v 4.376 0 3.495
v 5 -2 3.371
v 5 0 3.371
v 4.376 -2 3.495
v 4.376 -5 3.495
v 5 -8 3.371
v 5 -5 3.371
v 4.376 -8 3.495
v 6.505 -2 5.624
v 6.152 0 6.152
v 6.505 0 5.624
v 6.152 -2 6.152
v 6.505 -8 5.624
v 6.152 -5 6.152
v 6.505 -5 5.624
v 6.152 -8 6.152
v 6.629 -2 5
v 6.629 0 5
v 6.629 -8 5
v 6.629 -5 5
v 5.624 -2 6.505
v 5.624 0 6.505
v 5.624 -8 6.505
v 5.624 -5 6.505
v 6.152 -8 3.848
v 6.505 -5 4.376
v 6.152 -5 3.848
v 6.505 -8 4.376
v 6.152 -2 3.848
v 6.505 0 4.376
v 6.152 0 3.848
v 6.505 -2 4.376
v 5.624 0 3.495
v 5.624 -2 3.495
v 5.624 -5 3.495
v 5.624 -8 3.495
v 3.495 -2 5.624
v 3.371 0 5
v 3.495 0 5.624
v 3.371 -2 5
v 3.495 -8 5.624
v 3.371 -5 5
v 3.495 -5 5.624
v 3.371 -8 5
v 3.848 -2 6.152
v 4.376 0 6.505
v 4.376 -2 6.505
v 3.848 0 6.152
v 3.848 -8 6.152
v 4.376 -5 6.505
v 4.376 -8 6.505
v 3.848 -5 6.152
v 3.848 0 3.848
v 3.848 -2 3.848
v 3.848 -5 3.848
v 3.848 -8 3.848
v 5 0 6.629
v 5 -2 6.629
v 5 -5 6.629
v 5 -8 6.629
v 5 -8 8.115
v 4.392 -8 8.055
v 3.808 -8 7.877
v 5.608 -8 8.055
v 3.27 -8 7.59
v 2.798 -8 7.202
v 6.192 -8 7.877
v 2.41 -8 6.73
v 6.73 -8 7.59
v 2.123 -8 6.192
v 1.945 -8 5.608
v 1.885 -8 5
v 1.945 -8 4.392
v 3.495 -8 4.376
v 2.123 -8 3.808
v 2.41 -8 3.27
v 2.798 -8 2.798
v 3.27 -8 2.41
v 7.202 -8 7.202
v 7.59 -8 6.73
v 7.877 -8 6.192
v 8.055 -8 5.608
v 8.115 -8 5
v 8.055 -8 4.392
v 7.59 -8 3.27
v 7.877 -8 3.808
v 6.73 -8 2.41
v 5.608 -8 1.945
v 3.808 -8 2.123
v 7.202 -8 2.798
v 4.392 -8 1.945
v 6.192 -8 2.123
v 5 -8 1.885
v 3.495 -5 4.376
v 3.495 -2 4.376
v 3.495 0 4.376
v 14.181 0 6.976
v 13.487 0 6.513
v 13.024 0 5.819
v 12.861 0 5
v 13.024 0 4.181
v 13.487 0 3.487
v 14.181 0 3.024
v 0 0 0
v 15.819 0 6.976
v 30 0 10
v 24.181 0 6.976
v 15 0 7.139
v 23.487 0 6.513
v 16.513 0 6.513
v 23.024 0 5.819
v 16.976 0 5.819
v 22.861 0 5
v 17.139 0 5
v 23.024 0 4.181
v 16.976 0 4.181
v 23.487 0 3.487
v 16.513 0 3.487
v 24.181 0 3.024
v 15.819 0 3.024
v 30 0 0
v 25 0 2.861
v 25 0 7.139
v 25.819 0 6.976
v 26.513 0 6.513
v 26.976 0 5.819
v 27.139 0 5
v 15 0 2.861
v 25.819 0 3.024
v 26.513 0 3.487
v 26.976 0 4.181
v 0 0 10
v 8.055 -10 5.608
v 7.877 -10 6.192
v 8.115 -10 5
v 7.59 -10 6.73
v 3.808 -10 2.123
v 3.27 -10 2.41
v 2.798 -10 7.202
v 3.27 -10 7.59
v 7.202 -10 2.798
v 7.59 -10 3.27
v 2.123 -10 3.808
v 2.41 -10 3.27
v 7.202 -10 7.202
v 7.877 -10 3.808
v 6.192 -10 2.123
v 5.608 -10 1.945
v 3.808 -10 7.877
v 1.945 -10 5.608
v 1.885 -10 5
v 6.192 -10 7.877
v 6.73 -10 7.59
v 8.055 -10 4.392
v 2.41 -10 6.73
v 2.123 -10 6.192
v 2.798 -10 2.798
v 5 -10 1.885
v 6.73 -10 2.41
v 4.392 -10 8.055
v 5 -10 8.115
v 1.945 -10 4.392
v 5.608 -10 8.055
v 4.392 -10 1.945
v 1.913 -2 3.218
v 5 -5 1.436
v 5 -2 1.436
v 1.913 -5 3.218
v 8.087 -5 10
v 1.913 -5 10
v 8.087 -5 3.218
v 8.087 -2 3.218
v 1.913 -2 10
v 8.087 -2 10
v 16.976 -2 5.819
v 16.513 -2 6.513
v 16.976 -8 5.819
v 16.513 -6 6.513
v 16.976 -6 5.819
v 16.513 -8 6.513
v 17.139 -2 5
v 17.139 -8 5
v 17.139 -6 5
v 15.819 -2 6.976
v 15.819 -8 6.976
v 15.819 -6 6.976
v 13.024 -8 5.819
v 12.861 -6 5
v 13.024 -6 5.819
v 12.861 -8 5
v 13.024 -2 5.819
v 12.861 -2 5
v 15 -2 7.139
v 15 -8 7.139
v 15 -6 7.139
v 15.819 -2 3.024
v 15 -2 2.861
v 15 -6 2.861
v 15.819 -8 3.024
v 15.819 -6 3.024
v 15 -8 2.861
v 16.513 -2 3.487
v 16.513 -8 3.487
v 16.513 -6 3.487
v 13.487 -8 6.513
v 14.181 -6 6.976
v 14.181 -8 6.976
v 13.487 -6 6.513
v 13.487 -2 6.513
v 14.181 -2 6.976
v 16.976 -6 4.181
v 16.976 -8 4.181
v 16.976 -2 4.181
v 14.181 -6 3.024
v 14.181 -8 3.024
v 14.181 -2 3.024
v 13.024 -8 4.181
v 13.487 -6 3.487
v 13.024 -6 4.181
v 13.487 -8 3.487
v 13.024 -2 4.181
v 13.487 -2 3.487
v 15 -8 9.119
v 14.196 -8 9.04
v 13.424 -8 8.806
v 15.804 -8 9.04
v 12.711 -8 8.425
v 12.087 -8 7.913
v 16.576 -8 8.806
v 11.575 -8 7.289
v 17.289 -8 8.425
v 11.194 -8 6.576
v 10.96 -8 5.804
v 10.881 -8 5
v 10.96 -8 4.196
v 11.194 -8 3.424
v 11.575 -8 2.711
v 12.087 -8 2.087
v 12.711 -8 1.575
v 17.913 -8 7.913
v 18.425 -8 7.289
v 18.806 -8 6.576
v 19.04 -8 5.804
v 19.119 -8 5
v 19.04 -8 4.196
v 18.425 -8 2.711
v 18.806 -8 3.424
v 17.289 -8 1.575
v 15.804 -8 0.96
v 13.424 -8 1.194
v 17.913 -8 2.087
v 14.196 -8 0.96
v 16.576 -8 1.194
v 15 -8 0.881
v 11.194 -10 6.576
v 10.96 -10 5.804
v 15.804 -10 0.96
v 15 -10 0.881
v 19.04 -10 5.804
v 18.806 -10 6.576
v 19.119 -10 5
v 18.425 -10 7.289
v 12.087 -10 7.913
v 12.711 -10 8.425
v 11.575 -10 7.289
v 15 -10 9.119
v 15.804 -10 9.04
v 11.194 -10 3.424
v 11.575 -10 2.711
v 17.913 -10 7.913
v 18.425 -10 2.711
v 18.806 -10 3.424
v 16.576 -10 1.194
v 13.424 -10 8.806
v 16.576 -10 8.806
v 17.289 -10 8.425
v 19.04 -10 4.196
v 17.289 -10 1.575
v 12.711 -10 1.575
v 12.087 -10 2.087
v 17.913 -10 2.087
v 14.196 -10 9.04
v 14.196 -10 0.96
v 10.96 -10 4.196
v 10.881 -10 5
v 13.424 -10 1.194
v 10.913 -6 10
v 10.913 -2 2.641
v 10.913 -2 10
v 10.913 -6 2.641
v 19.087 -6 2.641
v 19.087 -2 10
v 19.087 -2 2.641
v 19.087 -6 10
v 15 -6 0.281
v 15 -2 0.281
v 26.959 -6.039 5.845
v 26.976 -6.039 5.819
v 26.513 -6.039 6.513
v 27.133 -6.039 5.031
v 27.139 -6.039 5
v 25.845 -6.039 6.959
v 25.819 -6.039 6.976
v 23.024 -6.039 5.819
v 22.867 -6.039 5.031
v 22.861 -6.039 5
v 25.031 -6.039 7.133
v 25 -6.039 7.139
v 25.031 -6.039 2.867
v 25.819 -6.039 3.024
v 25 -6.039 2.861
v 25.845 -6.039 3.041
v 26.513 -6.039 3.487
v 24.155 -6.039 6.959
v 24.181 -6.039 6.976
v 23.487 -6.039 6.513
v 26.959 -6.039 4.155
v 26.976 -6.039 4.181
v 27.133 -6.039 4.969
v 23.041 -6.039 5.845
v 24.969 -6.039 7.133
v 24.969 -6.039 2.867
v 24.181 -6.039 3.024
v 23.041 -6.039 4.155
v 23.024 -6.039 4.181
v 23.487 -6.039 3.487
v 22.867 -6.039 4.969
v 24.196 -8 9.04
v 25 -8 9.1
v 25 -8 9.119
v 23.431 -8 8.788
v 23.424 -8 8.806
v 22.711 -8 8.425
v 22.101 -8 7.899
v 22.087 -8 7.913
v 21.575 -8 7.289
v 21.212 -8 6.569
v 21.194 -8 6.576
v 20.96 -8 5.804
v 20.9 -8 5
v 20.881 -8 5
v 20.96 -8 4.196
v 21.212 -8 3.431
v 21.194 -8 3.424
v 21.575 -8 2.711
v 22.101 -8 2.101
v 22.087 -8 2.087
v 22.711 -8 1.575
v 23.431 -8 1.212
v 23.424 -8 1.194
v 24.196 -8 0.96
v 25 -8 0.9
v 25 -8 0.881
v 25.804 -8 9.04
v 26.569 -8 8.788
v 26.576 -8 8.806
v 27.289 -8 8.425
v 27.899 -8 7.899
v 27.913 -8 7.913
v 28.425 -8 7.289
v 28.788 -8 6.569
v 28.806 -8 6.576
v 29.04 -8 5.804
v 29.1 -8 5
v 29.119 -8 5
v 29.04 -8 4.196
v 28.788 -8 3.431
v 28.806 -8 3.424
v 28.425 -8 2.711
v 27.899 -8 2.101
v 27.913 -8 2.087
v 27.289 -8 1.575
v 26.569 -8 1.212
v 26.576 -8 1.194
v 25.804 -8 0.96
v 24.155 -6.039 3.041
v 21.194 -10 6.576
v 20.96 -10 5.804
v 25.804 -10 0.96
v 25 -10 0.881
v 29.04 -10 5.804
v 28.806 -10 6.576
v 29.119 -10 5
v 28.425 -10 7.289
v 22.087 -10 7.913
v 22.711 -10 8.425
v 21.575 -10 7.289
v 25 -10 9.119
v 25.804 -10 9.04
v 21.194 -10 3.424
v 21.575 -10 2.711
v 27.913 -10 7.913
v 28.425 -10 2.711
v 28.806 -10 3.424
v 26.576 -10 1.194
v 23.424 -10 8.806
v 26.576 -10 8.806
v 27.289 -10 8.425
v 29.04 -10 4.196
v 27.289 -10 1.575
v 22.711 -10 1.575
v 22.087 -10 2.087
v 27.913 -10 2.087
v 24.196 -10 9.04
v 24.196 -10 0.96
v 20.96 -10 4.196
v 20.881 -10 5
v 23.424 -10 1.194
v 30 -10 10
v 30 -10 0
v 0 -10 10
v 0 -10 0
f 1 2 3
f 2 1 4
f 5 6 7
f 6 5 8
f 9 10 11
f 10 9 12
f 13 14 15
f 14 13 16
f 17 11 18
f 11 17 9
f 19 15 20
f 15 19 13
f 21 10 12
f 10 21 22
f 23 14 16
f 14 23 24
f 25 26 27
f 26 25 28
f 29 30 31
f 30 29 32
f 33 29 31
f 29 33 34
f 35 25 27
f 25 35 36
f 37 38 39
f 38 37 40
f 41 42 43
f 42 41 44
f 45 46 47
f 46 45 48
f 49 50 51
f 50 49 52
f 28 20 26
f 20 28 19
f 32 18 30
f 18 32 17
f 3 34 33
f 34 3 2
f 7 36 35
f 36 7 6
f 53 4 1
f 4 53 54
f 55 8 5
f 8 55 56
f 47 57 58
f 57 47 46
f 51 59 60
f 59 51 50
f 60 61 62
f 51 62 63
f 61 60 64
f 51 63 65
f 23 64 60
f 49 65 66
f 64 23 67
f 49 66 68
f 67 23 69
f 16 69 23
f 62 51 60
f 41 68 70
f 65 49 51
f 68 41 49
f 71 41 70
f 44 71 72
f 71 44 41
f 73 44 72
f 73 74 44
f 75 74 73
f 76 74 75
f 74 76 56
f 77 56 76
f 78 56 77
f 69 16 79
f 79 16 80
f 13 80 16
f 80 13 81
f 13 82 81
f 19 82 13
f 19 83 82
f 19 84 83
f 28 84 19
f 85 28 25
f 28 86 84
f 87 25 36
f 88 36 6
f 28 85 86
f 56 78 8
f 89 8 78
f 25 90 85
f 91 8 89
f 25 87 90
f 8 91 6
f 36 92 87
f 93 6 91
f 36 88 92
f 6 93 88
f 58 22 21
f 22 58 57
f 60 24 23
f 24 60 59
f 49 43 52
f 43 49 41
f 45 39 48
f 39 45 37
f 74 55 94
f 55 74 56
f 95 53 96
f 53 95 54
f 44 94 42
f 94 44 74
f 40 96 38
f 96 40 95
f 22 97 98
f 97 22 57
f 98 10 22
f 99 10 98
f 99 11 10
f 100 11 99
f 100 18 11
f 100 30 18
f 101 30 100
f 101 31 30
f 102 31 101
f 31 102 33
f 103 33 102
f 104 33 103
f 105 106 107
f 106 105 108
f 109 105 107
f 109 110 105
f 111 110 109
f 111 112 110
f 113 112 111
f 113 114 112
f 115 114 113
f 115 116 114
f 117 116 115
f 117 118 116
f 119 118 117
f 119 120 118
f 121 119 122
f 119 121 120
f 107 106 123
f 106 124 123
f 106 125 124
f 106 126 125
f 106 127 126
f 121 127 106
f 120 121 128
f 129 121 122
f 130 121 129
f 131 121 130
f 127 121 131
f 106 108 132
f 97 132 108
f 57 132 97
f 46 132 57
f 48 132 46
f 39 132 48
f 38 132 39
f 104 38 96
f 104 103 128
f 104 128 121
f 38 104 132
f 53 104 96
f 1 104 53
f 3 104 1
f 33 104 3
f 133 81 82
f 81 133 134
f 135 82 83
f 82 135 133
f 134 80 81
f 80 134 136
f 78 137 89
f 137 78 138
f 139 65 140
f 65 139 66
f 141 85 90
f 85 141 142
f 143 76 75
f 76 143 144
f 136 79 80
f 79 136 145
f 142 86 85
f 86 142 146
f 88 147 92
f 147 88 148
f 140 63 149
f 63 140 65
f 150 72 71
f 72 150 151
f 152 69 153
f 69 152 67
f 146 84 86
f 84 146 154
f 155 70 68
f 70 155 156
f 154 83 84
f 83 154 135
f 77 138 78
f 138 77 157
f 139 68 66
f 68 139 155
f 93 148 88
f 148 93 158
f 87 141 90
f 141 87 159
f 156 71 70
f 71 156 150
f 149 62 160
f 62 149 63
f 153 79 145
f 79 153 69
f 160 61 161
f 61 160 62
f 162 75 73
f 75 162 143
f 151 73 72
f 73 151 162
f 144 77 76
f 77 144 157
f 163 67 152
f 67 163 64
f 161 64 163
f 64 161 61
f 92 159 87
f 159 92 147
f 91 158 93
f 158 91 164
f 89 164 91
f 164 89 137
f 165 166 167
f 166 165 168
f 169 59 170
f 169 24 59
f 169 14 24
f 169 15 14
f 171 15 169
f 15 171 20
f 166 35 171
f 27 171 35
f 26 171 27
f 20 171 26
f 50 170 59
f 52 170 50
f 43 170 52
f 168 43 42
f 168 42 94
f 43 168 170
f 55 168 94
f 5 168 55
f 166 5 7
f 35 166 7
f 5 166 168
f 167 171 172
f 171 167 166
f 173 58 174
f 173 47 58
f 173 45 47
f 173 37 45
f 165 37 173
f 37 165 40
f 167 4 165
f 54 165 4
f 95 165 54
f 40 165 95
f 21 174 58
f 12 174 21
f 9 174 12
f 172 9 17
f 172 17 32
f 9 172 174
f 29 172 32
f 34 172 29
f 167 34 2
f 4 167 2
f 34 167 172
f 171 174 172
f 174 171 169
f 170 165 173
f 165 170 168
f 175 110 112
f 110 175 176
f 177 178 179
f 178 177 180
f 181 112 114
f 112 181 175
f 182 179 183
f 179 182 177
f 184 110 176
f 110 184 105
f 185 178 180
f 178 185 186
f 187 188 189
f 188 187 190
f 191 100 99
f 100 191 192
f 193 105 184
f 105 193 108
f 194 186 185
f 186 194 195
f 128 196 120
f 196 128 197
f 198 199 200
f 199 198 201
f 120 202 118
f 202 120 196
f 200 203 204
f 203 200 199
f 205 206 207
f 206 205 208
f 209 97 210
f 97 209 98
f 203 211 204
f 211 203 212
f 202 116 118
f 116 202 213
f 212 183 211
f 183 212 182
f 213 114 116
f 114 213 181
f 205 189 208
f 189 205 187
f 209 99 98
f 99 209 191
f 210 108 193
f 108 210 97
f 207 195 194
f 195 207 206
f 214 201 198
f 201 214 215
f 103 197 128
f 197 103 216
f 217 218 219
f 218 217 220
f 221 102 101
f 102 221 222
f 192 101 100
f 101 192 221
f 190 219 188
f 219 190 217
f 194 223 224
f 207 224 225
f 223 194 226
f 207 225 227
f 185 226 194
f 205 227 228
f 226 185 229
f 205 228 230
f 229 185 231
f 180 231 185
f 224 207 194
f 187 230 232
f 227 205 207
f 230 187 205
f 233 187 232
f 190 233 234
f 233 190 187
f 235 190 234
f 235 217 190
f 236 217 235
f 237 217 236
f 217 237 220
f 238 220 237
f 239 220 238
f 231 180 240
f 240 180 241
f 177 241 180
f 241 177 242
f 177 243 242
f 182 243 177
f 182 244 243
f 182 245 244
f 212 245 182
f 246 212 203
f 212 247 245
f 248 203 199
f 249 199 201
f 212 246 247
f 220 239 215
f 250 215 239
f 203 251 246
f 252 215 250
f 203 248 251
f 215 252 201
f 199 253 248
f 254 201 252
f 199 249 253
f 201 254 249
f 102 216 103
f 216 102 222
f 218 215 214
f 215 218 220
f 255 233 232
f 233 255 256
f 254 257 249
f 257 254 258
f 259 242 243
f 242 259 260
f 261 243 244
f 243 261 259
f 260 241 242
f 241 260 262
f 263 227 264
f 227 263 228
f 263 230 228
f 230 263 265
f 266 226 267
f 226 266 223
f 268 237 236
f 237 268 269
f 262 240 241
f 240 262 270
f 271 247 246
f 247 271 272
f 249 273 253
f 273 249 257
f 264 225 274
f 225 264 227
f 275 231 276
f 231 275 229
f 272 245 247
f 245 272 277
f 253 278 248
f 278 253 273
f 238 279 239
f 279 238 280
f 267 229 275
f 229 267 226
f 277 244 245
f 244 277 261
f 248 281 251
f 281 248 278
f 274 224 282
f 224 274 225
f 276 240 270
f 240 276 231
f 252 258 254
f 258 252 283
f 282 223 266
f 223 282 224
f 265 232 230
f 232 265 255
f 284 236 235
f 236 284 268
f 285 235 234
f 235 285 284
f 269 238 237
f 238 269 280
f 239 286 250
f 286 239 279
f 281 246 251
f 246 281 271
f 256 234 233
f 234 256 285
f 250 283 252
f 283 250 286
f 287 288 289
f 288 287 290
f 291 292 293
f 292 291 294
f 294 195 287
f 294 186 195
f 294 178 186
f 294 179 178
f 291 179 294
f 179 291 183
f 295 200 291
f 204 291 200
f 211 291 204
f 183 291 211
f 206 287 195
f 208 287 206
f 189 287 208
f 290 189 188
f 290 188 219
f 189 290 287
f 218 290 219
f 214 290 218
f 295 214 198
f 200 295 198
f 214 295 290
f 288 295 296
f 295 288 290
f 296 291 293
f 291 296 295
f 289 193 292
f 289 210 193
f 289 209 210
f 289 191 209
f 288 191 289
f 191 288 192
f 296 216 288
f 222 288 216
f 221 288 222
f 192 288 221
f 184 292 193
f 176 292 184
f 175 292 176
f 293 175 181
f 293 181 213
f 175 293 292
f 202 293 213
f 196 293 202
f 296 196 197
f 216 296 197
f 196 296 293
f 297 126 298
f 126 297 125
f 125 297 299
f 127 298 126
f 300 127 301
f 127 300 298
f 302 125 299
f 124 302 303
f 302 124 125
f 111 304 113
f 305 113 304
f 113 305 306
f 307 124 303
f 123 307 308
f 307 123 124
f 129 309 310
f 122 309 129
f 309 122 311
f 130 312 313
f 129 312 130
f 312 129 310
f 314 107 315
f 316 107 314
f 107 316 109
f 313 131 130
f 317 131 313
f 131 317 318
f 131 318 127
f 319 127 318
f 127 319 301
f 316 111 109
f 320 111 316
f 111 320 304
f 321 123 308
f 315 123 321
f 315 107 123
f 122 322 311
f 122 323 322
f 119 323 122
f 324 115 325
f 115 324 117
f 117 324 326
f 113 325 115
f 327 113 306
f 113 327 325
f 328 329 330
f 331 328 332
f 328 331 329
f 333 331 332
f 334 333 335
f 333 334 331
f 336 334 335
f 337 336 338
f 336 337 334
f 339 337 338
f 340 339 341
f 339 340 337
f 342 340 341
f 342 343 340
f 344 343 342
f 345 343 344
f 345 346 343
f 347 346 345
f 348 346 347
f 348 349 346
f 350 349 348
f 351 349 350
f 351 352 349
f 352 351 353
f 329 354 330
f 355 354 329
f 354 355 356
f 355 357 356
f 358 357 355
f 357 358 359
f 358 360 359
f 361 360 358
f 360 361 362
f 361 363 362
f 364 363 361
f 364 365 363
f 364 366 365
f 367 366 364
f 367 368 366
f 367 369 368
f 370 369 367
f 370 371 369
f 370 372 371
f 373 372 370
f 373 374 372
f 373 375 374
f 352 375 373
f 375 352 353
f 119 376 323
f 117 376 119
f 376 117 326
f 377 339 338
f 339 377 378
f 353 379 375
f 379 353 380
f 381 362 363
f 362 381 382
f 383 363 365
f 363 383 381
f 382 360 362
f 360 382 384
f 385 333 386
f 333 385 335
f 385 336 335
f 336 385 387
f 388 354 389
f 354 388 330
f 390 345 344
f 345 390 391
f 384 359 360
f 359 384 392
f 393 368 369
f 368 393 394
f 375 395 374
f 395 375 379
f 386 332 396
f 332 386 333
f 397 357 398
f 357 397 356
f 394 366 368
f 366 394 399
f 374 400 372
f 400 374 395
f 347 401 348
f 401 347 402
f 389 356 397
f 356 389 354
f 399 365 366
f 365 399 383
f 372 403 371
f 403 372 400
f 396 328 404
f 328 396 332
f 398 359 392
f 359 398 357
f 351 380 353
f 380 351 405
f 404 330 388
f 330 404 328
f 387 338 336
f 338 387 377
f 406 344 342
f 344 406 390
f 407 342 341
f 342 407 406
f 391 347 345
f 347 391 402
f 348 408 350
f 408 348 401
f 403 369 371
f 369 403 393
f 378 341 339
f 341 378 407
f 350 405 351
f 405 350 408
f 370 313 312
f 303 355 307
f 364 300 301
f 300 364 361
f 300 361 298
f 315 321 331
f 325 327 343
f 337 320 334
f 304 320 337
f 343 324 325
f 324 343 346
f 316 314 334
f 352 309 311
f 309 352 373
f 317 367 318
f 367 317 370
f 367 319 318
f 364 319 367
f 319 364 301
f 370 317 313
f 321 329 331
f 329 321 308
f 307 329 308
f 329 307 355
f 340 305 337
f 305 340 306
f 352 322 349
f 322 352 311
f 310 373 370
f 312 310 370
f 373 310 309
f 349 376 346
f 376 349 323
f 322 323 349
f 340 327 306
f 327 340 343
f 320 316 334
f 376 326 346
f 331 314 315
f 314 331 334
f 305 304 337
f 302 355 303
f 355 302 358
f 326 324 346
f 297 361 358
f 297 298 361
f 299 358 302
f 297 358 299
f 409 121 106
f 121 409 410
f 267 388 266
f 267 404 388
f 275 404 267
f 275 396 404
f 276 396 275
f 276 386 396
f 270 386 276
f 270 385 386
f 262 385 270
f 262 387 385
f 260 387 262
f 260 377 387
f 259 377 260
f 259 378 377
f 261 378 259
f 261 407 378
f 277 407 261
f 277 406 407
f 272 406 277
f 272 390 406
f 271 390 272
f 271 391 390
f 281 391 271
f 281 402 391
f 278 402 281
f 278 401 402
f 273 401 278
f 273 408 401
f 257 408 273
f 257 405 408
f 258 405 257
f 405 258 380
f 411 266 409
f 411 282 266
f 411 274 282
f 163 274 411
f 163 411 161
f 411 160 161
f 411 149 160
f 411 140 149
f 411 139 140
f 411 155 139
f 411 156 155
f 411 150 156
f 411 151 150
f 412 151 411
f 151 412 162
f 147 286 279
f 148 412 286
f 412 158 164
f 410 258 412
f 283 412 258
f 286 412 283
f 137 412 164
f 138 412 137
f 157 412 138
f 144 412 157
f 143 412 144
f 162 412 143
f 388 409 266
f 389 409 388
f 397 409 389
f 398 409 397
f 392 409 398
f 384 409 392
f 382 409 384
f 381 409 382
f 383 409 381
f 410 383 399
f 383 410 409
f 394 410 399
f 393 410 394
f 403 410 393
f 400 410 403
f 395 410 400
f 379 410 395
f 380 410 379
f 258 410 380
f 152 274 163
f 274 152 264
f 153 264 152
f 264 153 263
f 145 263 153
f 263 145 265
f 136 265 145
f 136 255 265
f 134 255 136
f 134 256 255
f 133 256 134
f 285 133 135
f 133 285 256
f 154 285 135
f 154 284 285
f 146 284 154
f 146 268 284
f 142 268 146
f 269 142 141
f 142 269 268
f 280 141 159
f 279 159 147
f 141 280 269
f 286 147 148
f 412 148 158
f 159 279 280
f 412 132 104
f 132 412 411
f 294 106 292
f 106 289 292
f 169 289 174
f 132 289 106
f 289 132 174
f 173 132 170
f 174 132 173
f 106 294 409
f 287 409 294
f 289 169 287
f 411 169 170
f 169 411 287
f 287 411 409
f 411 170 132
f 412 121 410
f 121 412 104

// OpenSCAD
$radial_error = 0.1;
$fn = 16;

module cylinder_outer(height, radius, fn=$fn, extension=0) {
	fudge = 1/cos(180/fn);
	translate([0, 0, -extension]) cylinder(h=height+extension,r=radius*fudge+$radial_error, $fn=fn);
}

module cylinder_inner(height, radius, fn=$fn, extension=0) {
	translate([0, 0, -extension]) cylinder(h=height+extension,r=radius-$radial_error,$fn=fn);
}

// Make a hole for a bolt/screw combination.
module bolt(diameter=3, depth=8, nut_offset=2, shaft_length=10, inset=10) {
	hole(diameter, depth, inset);
	hull() {
		shaft_width = diameter;
		translate([0, 0, nut_offset]) rotate(360/12, [0, 0, 1]) cylinder_outer(diameter, shaft_width, 6);
		translate([0, shaft_length, nut_offset]) rotate(360/12, [0, 0, 1]) cylinder_outer(diameter, shaft_width, 6);
	}
}

// Make a hole. The diameter is the size of the screw (e.g. 3 for M3). Depth is how far the hole should go for the thread, and inset is how far out there should be a hole for the head to go.
module hole(diameter=3, depth=6, inset=10, extension=0) {
	cylinder_outer(depth, diameter/2, extension=extension);
	translate([0, 0, depth]) cylinder_outer(inset, diameter, 32);
}

module countersunk_hole(diameter=3, depth=6, inset=10) {
	hole(diameter, depth, inset);
	translate([0, 0, depth-diameter/2]) cylinder(r1=diameter/2+$radial_error, r2=diameter+$radial_error, h=diameter/2);
}

module mounting_hole(diameter=3, depth=6, inset=10, outset=3) {
	difference() {
		cylinder_outer(depth, diameter/2+outset);
		hole(diameter=diameter, depth=depth, inset=inset);
	}
}

rotate(90, [1, 0, 0]) difference() {
	cube([30, 10, 10]);
	translate([5, 5, 0]) bolt(diameter=3, depth=8);
	translate([15, 5, 0]) bolt(diameter=4, depth=8);
	translate([25, 5, 0]) countersunk_hole(diameter=4, depth=8);
}
